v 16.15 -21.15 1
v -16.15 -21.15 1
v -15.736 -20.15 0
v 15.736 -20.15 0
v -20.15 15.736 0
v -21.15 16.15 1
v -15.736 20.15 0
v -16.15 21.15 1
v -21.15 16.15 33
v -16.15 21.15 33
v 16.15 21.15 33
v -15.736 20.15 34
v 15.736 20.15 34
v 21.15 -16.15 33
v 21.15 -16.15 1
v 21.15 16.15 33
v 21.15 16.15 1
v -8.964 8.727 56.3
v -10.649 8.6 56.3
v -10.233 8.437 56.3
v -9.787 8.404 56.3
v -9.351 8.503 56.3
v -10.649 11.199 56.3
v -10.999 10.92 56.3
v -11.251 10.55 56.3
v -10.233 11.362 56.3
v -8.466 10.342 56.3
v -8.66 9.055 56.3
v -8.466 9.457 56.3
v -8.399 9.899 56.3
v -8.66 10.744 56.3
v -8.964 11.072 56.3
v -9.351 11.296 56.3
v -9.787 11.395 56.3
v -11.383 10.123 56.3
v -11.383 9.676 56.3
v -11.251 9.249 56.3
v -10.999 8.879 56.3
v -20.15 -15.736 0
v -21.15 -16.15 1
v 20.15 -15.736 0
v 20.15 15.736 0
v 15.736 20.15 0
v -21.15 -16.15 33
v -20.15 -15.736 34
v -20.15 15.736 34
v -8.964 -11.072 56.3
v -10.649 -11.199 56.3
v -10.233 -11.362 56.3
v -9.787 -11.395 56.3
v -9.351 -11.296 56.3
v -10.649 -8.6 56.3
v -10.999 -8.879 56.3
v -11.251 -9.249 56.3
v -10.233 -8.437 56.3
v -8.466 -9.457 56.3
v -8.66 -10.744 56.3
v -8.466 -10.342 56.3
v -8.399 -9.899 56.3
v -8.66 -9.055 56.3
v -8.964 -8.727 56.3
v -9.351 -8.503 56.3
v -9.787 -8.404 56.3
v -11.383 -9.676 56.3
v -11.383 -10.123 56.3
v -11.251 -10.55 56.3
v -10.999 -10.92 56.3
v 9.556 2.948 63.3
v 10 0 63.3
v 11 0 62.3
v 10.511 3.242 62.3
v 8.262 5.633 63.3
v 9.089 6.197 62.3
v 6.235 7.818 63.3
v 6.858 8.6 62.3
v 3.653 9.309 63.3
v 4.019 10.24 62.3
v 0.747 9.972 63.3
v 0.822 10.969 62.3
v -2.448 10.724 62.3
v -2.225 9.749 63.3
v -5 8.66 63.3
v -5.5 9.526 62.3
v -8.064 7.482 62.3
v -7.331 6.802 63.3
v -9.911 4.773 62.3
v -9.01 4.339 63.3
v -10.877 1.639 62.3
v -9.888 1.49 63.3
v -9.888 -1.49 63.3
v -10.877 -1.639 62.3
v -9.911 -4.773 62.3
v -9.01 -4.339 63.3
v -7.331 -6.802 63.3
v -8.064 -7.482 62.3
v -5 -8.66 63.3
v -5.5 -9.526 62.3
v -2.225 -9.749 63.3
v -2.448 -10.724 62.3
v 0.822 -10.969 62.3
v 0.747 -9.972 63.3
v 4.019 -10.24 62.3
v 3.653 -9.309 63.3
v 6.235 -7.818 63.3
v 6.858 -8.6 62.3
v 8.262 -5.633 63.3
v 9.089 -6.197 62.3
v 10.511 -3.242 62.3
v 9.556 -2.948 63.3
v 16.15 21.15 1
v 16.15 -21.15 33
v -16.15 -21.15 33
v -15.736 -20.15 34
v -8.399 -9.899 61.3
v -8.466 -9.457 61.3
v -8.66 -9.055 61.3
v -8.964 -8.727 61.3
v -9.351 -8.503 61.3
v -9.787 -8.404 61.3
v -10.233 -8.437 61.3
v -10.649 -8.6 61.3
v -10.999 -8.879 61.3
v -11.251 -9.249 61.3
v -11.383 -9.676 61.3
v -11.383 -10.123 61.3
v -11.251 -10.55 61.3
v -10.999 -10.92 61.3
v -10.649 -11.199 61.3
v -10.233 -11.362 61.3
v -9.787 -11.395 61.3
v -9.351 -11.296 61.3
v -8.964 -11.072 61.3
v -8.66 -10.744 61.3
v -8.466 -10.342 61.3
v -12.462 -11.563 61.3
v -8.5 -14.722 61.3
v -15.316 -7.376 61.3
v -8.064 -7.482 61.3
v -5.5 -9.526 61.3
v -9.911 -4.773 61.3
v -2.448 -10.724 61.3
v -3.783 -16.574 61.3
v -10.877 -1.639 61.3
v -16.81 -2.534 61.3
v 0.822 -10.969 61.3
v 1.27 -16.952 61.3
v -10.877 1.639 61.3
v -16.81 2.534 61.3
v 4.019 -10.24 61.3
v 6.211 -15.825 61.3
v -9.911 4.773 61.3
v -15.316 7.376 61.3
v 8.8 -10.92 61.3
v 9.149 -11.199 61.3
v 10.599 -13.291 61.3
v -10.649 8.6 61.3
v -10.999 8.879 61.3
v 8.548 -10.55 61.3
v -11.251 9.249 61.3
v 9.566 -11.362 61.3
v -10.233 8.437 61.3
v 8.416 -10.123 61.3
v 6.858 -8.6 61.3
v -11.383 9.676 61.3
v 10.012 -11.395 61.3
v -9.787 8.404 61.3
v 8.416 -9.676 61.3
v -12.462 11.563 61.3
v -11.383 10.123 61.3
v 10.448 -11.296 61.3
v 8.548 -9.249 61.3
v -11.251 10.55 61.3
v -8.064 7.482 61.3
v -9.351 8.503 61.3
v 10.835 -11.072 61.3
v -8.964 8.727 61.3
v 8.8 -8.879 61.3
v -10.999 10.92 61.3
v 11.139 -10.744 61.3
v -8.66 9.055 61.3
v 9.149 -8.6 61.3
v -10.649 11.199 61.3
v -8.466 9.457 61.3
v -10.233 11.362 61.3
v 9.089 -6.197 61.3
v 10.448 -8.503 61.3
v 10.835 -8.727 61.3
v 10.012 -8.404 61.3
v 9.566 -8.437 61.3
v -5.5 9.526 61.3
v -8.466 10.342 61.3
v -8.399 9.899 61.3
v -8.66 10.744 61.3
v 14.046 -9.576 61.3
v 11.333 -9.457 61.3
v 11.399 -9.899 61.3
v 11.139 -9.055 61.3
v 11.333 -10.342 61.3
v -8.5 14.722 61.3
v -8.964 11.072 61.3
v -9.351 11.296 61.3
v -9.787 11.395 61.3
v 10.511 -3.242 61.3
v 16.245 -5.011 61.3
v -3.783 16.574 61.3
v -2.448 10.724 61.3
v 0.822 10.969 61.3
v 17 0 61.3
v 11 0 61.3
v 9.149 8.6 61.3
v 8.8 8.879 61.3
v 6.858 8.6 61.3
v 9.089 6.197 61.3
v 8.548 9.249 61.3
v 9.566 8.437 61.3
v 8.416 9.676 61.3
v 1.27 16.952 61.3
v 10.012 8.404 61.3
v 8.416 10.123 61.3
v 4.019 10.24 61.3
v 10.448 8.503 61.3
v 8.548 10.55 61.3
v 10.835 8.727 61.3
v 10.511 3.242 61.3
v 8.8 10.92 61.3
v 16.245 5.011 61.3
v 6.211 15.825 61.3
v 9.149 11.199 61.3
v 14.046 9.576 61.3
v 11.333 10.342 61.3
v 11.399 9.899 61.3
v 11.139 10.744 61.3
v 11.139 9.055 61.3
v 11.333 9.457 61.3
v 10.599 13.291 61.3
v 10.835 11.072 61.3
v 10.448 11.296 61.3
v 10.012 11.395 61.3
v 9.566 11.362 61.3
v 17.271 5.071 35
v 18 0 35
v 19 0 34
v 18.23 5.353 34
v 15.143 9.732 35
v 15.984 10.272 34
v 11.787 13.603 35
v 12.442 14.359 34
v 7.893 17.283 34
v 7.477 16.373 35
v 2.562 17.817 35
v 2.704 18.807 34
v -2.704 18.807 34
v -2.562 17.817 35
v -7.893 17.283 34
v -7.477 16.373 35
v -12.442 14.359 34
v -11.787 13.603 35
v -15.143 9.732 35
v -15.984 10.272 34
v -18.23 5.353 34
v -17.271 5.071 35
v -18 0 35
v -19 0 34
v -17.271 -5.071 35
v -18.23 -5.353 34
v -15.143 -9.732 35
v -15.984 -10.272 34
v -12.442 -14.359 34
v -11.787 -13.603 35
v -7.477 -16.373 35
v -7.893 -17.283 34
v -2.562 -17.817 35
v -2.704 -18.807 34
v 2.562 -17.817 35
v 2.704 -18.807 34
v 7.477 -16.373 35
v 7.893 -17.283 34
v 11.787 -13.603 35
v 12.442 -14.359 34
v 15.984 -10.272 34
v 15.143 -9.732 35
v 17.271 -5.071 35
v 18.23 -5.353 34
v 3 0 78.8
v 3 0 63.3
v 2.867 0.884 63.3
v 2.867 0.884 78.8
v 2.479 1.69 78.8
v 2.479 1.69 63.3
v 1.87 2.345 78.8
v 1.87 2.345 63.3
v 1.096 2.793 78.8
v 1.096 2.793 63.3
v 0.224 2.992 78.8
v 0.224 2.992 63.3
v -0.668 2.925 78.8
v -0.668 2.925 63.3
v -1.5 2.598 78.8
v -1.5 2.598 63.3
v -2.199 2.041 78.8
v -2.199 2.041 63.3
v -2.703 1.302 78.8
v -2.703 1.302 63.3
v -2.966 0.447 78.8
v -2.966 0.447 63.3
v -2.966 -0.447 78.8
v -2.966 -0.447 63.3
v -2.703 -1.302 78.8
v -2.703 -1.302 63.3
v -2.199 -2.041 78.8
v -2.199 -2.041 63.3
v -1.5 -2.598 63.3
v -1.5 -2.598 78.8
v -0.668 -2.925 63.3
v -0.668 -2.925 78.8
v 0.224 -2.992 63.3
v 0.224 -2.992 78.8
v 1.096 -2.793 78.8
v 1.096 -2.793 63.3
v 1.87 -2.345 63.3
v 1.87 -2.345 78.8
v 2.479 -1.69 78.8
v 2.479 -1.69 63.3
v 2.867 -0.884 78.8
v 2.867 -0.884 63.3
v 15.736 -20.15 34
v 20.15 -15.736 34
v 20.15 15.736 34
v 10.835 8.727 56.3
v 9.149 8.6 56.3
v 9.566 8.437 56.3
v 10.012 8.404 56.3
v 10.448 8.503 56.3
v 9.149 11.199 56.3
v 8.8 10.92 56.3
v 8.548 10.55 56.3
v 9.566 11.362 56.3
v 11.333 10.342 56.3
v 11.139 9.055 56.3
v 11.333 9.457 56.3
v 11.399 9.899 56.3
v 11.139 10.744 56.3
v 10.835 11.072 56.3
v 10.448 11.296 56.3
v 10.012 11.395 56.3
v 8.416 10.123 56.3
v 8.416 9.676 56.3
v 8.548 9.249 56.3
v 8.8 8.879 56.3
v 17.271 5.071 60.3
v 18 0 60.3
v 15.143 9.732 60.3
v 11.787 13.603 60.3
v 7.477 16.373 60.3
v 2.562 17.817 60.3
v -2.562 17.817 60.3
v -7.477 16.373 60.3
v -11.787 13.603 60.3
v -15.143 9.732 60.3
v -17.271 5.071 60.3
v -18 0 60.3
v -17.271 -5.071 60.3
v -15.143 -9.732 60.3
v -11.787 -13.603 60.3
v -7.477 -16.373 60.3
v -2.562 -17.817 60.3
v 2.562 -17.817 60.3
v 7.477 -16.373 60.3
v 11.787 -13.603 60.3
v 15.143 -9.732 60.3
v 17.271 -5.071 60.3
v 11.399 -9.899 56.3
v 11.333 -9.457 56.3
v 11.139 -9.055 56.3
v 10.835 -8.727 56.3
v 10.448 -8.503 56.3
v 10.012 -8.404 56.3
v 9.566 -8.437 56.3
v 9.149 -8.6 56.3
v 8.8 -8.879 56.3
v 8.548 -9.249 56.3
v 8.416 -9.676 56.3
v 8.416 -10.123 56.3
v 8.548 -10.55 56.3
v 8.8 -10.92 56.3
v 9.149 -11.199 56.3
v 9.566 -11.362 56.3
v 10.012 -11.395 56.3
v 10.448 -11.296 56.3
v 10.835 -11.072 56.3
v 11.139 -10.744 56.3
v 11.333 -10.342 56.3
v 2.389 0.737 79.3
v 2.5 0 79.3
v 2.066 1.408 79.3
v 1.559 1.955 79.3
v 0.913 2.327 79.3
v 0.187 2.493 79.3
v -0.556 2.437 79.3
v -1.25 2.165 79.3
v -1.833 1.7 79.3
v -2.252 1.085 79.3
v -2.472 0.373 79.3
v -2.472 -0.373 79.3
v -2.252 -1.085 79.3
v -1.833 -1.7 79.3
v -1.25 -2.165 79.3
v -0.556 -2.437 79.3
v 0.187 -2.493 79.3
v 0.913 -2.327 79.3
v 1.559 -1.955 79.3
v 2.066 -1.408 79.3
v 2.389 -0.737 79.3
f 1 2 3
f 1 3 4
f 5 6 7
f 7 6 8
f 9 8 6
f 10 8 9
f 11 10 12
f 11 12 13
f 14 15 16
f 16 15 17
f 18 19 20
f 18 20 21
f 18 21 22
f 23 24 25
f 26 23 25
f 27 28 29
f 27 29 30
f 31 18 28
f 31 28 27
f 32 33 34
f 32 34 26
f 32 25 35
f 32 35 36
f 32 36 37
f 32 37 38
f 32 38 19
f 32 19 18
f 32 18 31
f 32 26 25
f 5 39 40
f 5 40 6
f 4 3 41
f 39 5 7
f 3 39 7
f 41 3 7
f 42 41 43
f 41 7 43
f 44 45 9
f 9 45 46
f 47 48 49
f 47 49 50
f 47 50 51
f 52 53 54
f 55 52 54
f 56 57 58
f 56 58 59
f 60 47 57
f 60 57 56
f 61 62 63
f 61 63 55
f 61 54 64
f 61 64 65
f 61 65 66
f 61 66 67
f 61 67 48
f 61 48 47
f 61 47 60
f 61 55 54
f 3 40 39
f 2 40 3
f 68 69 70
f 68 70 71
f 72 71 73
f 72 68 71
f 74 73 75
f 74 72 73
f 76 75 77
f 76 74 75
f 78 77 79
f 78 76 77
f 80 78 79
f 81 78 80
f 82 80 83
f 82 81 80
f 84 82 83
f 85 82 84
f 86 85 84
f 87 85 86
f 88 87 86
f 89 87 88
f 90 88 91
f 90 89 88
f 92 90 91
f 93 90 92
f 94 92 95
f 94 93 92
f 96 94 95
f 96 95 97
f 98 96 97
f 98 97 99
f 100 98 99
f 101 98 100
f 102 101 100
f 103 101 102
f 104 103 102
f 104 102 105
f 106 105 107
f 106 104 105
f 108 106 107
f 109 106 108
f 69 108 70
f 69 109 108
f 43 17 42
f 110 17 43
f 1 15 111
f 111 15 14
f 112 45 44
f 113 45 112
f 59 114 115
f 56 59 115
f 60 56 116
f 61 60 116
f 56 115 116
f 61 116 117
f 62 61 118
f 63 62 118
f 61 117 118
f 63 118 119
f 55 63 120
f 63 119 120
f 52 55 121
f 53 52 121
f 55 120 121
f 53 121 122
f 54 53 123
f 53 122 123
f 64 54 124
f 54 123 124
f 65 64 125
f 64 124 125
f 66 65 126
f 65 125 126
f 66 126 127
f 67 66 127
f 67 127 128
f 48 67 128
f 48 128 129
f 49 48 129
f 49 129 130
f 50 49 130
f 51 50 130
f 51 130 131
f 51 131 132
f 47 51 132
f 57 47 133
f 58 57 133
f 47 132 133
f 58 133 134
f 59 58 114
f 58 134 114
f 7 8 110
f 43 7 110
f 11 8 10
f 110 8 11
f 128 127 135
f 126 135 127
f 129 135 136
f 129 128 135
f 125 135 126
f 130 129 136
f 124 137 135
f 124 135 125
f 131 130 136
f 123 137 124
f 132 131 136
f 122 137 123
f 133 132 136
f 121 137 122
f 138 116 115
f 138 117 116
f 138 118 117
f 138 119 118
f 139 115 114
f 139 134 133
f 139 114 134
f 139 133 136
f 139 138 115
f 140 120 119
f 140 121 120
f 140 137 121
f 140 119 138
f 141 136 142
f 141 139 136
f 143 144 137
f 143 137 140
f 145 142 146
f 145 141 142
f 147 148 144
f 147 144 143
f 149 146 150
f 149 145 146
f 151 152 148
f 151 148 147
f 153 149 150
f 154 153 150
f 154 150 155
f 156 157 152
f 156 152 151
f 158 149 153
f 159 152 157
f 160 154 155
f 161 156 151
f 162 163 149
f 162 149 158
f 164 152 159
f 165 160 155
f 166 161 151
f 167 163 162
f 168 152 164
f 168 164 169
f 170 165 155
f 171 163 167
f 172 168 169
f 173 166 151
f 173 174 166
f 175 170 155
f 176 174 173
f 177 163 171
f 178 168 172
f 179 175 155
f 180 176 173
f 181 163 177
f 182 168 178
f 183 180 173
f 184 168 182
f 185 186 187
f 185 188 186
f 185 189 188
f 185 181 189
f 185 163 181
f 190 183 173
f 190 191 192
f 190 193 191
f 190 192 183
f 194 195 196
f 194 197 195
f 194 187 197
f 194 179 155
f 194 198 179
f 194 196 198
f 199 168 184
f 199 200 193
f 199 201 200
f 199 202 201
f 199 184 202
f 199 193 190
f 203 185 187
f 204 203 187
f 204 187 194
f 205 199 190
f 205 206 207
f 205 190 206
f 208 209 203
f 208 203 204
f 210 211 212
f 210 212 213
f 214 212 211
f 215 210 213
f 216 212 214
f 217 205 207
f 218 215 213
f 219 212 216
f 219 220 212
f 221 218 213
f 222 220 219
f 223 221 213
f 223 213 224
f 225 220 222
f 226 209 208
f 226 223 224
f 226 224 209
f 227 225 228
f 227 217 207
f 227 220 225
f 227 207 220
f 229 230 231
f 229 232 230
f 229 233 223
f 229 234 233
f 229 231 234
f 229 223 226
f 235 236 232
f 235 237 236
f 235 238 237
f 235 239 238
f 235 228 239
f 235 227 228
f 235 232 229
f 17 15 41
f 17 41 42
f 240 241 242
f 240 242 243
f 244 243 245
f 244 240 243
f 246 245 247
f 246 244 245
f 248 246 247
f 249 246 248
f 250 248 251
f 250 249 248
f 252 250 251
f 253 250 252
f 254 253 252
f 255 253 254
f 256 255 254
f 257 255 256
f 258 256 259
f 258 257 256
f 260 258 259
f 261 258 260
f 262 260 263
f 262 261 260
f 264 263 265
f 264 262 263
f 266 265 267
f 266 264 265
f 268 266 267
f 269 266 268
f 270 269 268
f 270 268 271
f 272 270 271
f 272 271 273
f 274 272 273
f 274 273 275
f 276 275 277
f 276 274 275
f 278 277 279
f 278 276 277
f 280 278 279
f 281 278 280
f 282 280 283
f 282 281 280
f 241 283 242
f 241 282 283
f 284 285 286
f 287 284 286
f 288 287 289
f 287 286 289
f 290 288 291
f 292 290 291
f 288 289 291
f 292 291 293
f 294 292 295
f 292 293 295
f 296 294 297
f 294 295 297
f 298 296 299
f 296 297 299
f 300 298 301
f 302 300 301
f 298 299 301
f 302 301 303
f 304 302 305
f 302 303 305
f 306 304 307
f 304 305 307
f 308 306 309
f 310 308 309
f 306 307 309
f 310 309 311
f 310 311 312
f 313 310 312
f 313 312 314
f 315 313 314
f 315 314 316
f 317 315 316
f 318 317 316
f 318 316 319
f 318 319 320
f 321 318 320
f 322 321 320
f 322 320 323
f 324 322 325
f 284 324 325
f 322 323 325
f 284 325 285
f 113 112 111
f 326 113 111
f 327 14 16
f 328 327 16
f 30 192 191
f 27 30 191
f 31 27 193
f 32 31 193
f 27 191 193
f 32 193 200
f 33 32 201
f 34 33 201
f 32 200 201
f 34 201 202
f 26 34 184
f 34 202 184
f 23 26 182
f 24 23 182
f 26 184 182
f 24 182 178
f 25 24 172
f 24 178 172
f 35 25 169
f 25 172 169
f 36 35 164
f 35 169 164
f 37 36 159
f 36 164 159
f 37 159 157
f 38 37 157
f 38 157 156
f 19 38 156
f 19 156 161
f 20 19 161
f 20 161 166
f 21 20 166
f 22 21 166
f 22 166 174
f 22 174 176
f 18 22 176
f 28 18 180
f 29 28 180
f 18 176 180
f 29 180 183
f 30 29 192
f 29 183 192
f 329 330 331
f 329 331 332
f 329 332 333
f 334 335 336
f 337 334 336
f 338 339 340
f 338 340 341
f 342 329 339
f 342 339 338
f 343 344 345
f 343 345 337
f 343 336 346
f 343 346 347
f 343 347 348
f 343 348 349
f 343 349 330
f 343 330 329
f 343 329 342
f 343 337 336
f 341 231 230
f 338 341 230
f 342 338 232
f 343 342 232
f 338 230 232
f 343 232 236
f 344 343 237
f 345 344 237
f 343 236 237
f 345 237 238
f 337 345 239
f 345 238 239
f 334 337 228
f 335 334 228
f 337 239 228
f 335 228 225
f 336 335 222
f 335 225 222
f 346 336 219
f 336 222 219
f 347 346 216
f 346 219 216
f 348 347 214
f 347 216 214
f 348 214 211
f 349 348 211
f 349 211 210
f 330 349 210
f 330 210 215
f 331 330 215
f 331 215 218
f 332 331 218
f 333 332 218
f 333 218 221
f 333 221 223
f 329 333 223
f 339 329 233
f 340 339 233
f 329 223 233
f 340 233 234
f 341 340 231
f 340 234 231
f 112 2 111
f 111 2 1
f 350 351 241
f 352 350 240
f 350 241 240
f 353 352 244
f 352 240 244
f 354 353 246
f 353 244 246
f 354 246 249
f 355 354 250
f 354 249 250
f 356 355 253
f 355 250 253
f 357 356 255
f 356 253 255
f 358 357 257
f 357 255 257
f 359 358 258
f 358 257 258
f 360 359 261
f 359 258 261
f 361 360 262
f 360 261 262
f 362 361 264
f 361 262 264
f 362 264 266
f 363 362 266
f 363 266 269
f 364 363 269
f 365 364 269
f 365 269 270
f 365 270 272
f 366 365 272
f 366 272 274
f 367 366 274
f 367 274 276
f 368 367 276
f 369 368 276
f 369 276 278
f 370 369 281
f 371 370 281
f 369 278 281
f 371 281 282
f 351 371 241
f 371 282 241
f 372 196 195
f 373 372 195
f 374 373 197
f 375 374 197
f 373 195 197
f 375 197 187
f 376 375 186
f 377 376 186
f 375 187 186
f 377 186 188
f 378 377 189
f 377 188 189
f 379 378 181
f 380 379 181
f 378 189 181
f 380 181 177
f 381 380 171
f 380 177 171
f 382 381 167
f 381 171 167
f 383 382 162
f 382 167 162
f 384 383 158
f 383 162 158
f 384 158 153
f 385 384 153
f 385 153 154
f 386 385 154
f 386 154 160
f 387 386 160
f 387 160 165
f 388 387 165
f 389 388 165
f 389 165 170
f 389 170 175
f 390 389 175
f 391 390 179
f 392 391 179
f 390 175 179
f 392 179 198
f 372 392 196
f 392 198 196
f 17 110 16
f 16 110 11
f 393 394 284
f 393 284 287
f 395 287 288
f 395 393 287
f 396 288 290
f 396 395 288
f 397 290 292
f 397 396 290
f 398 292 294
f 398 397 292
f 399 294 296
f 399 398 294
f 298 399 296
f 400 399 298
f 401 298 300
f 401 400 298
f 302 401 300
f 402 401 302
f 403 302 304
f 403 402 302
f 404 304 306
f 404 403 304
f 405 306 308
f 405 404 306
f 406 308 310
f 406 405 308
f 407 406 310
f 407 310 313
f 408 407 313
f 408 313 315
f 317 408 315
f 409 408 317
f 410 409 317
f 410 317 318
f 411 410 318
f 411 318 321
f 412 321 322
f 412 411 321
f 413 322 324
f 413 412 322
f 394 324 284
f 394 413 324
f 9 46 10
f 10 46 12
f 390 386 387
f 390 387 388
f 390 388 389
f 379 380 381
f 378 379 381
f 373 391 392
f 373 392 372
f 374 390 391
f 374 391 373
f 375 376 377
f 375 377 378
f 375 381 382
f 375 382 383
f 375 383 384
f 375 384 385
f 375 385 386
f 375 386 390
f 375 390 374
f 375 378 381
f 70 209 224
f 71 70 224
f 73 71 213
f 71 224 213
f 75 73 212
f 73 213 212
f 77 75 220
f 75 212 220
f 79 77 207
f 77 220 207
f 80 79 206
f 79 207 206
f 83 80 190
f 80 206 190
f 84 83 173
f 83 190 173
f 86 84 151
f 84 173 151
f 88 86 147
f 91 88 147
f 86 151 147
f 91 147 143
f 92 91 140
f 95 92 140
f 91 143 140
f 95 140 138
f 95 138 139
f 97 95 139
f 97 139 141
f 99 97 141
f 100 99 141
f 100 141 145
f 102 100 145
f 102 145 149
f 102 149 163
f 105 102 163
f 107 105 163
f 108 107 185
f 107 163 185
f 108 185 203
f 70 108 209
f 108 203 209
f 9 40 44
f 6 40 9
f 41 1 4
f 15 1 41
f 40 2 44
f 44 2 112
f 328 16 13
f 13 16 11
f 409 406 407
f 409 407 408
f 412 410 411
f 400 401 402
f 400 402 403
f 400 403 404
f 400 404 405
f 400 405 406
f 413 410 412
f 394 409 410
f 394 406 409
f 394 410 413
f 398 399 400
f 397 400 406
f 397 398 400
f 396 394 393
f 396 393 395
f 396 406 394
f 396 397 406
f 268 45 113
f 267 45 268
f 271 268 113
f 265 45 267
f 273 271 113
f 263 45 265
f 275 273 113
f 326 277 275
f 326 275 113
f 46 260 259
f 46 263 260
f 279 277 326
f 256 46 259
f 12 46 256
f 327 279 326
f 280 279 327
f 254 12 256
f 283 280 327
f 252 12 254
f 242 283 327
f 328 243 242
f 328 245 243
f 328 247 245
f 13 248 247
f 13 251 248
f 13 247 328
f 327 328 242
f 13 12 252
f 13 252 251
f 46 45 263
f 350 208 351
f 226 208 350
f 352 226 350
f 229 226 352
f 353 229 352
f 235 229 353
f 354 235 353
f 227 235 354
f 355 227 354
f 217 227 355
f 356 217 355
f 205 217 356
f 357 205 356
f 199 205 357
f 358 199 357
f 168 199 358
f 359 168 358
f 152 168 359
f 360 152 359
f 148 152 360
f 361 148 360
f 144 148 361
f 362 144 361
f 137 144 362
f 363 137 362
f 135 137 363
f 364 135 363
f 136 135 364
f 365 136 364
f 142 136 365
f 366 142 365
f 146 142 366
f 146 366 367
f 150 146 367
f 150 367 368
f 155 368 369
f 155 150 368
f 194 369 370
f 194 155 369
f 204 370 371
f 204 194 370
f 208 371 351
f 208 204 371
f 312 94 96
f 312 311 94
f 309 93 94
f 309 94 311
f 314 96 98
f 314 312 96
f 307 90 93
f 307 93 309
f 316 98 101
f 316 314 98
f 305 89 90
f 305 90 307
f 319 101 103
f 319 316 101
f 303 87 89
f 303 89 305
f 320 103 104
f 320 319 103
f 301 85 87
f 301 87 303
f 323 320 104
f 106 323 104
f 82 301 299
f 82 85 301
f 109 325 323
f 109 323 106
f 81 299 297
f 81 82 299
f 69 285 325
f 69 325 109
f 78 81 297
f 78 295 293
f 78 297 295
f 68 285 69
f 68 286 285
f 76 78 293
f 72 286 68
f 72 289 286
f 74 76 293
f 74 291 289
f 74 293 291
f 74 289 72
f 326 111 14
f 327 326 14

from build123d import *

# Parameters (mm, degrees)
SKETCH1_W           = 42.3
SKETCH1_H           = 42.3
BOSS_EXTRUDE1_DEPTH = 34
CHAMFER1_SIZE       = 5
SKETCH2_R           = 18
BOSS_EXTRUDE2_DEPTH = 27.3
SKETCH3_R           = 11
BOSS_EXTRUDE3_DEPTH = 2
SKETCH4_R           = 3
BOSS_EXTRUDE4_DEPTH = 16
CHAMFER2_SIZE       = 1
CHAMFER3_SIZE       = 0.5
SKETCH5_R           = 1.5
CUT_EXTRUDE1_DEPTH  = 5


with BuildPart() as part:
    # Sketch1 → Boss-Extrude1 (new body)
    with BuildSketch(Plane.XY):
        Rectangle(SKETCH1_W, SKETCH1_H)
    extrude(amount=BOSS_EXTRUDE1_DEPTH)

    # Chamfer1
    chamfer1_edges = [part.edges().sort_by_distance(p)[0] for p in [
        (21.15, -21.15, 17),
        (-21.15, -21.15, 17),
        (-21.15, 21.15, 17),
        (21.15, 21.15, 17),
    ]]
    chamfer(chamfer1_edges, length=CHAMFER1_SIZE)

    # Sketch2 → Boss-Extrude2 (add)
    with BuildSketch(Plane.XY.offset(34)):
        Circle(SKETCH2_R)
    extrude(amount=BOSS_EXTRUDE2_DEPTH)

    # Sketch3 → Boss-Extrude3 (add)
    with BuildSketch(Plane.XY.offset(61.3)):
        Circle(SKETCH3_R)
    extrude(amount=BOSS_EXTRUDE3_DEPTH)

    # Sketch4 → Boss-Extrude4 (add)
    with BuildSketch(Plane.XY.offset(63.3)):
        Circle(SKETCH4_R)
    extrude(amount=BOSS_EXTRUDE4_DEPTH)

    # Chamfer2
    chamfer2_edges = [part.edges().sort_by_distance(p)[0] for p in [
        (0, -21.15, 0),
        (0, -21.15, 34),
        (21.15, 0, 0),
        (-21.15, 0, 0),
        (0, 21.15, 0),
        (18.65, 18.65, 0),
        (18.65, -18.65, 0),
        (-18.65, 18.65, 0),
        (-18.65, -18.65, 0),
        (-21.15, 0, 34),
        (21.15, 0, 34),
        (0, 21.15, 34),
        (18.65, 18.65, 34),
        (18.65, -18.65, 34),
        (-18.65, 18.65, 34),
        (-18.65, -18.65, 34),
        (-18, 0, 34),
        (-18, 0, 61.3),
        (-11, 0, 63.3),
    ]]
    chamfer(chamfer2_edges, length=CHAMFER2_SIZE)

    # Chamfer3
    chamfer3_edges = [part.edges().sort_by_distance(p)[0] for p in [
        (-3, 0, 79.3),
    ]]
    chamfer(chamfer3_edges, length=CHAMFER3_SIZE)

    # Sketch5 → Cut-Extrude1 (cut)
    with BuildSketch(Plane.XY.offset(61.3)):
        with Locations((9.899494937, 9.899494937)):
            Circle(SKETCH5_R)
        with Locations((9.899494937, -9.899494937)):
            Circle(SKETCH5_R)
        with Locations((-9.899494937, -9.899494937)):
            Circle(SKETCH5_R)
        with Locations((-9.899494937, 9.899494937)):
            Circle(SKETCH5_R)
    extrude(amount=-CUT_EXTRUDE1_DEPTH, mode=Mode.SUBTRACT)


solid = part.part
